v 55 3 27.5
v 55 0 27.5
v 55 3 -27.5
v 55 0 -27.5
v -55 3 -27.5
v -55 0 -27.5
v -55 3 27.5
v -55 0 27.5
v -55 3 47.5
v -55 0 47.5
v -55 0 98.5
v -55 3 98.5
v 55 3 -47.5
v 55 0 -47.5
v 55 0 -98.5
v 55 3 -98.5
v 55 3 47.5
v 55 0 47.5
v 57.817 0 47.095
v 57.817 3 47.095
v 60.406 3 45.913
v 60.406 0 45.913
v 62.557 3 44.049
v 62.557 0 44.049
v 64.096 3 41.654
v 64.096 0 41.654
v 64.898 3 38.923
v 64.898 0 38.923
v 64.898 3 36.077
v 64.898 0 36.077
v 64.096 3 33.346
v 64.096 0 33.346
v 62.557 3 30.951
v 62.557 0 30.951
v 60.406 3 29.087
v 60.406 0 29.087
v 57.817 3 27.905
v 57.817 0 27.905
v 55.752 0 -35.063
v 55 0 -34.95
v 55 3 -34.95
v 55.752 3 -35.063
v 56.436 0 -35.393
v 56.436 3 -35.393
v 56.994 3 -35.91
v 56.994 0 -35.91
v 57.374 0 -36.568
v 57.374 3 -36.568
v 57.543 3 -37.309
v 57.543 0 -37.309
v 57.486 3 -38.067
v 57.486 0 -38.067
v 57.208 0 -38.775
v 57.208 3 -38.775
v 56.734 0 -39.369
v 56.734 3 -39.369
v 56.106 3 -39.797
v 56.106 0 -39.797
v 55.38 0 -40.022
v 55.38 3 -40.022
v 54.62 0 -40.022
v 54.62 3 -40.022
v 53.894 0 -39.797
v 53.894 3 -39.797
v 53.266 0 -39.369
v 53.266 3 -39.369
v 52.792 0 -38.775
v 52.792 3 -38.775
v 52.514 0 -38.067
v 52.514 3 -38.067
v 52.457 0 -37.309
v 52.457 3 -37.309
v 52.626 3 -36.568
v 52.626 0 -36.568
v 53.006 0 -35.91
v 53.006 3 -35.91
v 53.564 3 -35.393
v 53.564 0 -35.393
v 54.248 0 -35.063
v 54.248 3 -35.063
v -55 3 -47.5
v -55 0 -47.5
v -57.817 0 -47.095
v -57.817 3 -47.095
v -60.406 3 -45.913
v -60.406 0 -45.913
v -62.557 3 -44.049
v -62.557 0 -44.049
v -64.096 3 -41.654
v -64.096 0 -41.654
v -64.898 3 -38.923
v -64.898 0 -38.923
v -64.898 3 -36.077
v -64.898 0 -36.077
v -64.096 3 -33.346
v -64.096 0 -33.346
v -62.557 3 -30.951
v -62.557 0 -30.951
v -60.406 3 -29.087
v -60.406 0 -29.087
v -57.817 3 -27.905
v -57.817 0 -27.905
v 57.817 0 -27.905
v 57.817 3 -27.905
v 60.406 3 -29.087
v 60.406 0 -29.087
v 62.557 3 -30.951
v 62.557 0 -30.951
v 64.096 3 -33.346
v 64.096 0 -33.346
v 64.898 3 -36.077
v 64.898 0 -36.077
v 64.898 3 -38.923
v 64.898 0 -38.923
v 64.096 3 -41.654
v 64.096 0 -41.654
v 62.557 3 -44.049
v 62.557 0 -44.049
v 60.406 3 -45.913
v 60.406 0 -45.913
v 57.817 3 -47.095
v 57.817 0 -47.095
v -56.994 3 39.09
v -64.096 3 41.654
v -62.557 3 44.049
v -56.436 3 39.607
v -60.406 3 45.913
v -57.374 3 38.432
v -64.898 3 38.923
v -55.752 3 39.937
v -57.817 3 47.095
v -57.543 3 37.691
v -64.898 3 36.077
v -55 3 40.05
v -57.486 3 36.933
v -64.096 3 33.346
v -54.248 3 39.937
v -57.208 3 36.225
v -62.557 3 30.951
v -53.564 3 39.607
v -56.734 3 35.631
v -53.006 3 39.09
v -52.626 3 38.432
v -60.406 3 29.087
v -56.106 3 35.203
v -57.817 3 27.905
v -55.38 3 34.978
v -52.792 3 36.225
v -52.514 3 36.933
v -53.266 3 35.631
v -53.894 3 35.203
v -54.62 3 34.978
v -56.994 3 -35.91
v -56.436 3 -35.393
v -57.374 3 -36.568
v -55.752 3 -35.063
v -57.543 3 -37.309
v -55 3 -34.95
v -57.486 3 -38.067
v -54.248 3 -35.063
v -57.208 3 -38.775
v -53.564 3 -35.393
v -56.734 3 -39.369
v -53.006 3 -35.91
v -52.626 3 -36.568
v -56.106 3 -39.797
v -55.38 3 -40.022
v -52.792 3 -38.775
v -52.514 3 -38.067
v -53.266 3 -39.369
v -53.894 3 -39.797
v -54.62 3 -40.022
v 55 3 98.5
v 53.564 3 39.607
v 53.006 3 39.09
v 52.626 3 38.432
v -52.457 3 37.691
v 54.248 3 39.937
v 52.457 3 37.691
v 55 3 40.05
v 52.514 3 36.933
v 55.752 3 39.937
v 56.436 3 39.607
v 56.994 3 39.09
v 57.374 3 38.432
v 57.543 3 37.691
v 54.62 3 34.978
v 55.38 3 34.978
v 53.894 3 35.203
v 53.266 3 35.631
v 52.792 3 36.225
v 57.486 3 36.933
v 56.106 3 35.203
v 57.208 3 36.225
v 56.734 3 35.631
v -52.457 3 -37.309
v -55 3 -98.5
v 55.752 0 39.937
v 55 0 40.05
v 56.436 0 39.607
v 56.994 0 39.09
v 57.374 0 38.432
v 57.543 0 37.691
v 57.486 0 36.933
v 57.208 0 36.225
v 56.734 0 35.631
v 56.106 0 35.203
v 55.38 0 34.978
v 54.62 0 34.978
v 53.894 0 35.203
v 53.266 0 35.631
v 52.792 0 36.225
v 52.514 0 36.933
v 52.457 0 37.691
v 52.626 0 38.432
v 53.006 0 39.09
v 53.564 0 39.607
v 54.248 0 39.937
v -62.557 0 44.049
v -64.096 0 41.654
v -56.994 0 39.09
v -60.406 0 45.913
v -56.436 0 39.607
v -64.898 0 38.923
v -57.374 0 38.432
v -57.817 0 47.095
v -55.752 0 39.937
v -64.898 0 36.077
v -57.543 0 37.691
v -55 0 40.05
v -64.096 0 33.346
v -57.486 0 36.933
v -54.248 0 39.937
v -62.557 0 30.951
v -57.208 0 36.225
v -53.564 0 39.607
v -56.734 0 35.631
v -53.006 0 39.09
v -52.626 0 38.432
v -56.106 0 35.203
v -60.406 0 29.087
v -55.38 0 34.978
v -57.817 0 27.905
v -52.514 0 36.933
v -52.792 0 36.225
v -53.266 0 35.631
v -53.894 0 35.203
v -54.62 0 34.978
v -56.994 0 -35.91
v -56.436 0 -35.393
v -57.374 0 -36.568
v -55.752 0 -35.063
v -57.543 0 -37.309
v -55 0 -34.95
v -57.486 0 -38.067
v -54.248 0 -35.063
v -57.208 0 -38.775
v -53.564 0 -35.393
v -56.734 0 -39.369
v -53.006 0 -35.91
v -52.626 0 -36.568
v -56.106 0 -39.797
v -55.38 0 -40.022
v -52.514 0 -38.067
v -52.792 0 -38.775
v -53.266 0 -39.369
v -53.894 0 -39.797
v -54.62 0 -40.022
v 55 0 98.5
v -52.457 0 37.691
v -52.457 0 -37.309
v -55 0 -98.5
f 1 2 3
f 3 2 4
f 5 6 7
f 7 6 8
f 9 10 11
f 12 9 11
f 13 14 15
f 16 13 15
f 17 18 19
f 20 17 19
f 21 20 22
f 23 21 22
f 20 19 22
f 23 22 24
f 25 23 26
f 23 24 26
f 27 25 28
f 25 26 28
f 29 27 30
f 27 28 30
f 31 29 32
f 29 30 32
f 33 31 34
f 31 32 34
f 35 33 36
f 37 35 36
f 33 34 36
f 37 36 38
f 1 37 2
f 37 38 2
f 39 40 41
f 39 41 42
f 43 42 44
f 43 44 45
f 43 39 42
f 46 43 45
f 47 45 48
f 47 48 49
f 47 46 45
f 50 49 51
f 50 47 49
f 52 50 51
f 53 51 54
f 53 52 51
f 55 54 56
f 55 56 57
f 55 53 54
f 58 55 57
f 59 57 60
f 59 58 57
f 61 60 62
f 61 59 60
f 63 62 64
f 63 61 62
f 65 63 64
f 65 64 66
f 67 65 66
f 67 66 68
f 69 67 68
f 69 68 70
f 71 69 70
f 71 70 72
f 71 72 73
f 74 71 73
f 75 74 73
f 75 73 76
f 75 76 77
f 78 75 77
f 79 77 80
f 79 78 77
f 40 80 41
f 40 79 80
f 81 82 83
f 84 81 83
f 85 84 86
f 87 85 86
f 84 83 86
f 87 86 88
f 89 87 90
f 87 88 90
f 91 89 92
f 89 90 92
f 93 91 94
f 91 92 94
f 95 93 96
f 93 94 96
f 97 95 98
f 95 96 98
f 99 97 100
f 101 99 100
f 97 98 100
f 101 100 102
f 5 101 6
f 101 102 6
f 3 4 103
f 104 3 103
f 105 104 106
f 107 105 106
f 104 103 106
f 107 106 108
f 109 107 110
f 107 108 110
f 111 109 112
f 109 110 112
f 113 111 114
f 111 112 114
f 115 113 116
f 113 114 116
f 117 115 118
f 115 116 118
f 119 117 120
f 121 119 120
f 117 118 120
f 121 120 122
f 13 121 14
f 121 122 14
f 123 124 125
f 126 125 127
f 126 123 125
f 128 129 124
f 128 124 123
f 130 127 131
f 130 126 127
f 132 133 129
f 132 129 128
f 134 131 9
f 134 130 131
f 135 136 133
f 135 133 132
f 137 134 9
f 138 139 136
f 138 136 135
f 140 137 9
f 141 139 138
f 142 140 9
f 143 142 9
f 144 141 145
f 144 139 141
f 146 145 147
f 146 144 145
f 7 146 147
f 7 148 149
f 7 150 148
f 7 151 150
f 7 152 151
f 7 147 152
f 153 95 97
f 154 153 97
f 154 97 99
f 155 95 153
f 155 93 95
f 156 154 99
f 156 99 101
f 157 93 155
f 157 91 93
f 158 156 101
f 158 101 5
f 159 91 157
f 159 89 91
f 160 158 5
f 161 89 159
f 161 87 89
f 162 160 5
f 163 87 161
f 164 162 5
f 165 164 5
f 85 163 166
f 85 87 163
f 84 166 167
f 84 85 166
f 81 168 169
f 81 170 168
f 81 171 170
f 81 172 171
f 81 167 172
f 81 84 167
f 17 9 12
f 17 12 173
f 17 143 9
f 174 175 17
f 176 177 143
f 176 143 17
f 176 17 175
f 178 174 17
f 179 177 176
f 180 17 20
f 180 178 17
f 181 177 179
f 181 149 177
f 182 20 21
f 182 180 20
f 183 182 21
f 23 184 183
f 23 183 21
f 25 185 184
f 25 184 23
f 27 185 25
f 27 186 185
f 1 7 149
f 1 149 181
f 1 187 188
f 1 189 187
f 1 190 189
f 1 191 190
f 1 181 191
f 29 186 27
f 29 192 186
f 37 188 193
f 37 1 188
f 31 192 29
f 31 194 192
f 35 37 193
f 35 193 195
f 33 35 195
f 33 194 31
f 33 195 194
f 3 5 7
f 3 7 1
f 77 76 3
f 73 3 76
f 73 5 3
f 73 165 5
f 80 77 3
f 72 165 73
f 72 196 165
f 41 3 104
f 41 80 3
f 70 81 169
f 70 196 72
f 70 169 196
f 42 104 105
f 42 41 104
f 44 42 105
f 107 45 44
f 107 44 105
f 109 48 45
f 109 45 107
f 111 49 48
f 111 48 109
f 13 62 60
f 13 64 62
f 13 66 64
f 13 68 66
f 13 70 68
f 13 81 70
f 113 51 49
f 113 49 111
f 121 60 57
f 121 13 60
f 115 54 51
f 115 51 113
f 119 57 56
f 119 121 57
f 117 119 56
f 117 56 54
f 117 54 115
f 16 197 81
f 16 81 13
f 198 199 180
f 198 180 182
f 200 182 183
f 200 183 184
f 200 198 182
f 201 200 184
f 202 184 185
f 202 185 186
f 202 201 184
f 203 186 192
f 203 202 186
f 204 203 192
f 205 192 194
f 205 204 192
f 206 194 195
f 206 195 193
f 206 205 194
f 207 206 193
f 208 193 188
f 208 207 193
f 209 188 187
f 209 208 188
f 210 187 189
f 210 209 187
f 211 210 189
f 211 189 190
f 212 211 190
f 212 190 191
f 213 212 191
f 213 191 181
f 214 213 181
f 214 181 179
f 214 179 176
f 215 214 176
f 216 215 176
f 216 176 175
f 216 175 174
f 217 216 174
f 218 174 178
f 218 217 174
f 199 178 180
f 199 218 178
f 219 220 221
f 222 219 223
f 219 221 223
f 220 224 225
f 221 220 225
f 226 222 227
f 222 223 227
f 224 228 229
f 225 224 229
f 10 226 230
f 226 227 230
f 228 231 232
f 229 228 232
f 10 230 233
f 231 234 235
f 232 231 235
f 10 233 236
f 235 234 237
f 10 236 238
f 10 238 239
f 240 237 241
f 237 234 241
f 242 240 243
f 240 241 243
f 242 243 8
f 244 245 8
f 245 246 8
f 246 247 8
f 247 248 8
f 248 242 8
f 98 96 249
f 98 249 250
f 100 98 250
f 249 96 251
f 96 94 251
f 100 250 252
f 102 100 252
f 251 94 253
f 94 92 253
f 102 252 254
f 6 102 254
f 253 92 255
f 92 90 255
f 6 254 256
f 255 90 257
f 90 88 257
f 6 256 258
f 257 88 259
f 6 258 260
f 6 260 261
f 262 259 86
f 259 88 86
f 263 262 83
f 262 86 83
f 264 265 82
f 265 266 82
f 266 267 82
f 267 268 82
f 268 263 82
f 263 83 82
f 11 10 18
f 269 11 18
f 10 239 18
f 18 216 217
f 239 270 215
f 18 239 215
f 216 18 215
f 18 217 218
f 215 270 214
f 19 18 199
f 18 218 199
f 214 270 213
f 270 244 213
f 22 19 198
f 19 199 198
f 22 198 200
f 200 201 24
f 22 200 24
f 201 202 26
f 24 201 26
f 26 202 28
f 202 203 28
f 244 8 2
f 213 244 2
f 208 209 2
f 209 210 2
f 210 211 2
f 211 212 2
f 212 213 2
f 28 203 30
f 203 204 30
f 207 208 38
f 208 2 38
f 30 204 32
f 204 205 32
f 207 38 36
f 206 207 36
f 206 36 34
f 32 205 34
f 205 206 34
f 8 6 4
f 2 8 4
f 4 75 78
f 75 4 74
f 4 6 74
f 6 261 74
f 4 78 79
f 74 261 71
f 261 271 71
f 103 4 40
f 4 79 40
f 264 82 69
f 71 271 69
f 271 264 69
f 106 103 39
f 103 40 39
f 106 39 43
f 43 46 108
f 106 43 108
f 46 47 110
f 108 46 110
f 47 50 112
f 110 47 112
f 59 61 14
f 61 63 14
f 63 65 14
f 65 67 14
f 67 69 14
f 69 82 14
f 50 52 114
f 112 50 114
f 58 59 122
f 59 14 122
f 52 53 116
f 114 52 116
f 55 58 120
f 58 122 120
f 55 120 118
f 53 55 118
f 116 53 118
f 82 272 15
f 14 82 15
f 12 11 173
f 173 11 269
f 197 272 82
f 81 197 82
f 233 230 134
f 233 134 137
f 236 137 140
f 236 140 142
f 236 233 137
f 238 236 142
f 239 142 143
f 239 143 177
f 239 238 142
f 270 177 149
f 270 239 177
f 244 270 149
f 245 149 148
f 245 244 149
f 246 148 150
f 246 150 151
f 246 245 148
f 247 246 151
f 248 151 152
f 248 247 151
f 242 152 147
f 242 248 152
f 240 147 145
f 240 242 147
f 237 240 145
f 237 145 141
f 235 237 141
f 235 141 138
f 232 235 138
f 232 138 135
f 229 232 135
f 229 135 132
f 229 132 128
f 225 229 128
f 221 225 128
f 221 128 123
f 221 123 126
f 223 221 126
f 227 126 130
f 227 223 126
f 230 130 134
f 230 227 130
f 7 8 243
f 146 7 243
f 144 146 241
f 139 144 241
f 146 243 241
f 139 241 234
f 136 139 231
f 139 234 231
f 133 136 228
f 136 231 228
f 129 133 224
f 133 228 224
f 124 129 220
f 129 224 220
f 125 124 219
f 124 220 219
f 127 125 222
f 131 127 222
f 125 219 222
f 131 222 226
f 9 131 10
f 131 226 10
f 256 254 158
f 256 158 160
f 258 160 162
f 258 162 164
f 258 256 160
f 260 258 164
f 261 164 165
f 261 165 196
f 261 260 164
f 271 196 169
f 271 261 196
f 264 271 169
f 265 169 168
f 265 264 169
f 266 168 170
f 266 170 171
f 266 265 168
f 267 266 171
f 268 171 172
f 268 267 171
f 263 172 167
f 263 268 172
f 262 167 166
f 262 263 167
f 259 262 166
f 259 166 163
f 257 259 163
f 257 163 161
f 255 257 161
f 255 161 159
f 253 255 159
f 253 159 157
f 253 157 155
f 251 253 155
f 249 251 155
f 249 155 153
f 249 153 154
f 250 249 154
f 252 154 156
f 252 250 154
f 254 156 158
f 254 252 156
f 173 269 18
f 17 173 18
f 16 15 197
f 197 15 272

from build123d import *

# Parameters (mm, degrees)
SKETCH1_R           = 2.55
BOSS_EXTRUDE1_DEPTH = 3


with BuildPart() as part:
    # Sketch1 → Boss-Extrude1 (new body)
    with BuildSketch(Plane(origin=(0, 0, 0), x_dir=(1, 0, 0), z_dir=(0, 1, 0))):
        with BuildLine():
            Line((-55, 27.5), (-55, -27.5))
            ThreePointArc((-55, -27.5), (-65, -37.5), (-55, -47.5))
            Line((-55, -47.5), (-55, -98.5))
            Line((-55, -98.5), (55, -98.5))
            Line((55, -98.5), (55, -47.5))
            ThreePointArc((55, -47.5), (65, -37.5), (55, -27.5))
            Line((55, -27.5), (55, 27.5))
            ThreePointArc((55, 27.5), (65, 37.5), (55, 47.5))
            Line((55, 47.5), (55, 98.5))
            Line((55, 98.5), (-55, 98.5))
            Line((-55, 98.5), (-55, 47.5))
            ThreePointArc((-55, 47.5), (-65, 37.5), (-55, 27.5))
        make_face()
        with Locations(Location((-55, 37.5, 0), (0, 0, 270))):
            Circle(SKETCH1_R, mode=Mode.SUBTRACT)
        with Locations(Location((55, 37.5, 0), (0, 0, 270))):
            Circle(SKETCH1_R, mode=Mode.SUBTRACT)
        with Locations(Location((-55, -37.5, 0), (0, 0, 270))):
            Circle(SKETCH1_R, mode=Mode.SUBTRACT)
        with Locations(Location((55, -37.5, 0), (0, 0, 270))):
            Circle(SKETCH1_R, mode=Mode.SUBTRACT)
    extrude(amount=BOSS_EXTRUDE1_DEPTH)


solid = part.part
